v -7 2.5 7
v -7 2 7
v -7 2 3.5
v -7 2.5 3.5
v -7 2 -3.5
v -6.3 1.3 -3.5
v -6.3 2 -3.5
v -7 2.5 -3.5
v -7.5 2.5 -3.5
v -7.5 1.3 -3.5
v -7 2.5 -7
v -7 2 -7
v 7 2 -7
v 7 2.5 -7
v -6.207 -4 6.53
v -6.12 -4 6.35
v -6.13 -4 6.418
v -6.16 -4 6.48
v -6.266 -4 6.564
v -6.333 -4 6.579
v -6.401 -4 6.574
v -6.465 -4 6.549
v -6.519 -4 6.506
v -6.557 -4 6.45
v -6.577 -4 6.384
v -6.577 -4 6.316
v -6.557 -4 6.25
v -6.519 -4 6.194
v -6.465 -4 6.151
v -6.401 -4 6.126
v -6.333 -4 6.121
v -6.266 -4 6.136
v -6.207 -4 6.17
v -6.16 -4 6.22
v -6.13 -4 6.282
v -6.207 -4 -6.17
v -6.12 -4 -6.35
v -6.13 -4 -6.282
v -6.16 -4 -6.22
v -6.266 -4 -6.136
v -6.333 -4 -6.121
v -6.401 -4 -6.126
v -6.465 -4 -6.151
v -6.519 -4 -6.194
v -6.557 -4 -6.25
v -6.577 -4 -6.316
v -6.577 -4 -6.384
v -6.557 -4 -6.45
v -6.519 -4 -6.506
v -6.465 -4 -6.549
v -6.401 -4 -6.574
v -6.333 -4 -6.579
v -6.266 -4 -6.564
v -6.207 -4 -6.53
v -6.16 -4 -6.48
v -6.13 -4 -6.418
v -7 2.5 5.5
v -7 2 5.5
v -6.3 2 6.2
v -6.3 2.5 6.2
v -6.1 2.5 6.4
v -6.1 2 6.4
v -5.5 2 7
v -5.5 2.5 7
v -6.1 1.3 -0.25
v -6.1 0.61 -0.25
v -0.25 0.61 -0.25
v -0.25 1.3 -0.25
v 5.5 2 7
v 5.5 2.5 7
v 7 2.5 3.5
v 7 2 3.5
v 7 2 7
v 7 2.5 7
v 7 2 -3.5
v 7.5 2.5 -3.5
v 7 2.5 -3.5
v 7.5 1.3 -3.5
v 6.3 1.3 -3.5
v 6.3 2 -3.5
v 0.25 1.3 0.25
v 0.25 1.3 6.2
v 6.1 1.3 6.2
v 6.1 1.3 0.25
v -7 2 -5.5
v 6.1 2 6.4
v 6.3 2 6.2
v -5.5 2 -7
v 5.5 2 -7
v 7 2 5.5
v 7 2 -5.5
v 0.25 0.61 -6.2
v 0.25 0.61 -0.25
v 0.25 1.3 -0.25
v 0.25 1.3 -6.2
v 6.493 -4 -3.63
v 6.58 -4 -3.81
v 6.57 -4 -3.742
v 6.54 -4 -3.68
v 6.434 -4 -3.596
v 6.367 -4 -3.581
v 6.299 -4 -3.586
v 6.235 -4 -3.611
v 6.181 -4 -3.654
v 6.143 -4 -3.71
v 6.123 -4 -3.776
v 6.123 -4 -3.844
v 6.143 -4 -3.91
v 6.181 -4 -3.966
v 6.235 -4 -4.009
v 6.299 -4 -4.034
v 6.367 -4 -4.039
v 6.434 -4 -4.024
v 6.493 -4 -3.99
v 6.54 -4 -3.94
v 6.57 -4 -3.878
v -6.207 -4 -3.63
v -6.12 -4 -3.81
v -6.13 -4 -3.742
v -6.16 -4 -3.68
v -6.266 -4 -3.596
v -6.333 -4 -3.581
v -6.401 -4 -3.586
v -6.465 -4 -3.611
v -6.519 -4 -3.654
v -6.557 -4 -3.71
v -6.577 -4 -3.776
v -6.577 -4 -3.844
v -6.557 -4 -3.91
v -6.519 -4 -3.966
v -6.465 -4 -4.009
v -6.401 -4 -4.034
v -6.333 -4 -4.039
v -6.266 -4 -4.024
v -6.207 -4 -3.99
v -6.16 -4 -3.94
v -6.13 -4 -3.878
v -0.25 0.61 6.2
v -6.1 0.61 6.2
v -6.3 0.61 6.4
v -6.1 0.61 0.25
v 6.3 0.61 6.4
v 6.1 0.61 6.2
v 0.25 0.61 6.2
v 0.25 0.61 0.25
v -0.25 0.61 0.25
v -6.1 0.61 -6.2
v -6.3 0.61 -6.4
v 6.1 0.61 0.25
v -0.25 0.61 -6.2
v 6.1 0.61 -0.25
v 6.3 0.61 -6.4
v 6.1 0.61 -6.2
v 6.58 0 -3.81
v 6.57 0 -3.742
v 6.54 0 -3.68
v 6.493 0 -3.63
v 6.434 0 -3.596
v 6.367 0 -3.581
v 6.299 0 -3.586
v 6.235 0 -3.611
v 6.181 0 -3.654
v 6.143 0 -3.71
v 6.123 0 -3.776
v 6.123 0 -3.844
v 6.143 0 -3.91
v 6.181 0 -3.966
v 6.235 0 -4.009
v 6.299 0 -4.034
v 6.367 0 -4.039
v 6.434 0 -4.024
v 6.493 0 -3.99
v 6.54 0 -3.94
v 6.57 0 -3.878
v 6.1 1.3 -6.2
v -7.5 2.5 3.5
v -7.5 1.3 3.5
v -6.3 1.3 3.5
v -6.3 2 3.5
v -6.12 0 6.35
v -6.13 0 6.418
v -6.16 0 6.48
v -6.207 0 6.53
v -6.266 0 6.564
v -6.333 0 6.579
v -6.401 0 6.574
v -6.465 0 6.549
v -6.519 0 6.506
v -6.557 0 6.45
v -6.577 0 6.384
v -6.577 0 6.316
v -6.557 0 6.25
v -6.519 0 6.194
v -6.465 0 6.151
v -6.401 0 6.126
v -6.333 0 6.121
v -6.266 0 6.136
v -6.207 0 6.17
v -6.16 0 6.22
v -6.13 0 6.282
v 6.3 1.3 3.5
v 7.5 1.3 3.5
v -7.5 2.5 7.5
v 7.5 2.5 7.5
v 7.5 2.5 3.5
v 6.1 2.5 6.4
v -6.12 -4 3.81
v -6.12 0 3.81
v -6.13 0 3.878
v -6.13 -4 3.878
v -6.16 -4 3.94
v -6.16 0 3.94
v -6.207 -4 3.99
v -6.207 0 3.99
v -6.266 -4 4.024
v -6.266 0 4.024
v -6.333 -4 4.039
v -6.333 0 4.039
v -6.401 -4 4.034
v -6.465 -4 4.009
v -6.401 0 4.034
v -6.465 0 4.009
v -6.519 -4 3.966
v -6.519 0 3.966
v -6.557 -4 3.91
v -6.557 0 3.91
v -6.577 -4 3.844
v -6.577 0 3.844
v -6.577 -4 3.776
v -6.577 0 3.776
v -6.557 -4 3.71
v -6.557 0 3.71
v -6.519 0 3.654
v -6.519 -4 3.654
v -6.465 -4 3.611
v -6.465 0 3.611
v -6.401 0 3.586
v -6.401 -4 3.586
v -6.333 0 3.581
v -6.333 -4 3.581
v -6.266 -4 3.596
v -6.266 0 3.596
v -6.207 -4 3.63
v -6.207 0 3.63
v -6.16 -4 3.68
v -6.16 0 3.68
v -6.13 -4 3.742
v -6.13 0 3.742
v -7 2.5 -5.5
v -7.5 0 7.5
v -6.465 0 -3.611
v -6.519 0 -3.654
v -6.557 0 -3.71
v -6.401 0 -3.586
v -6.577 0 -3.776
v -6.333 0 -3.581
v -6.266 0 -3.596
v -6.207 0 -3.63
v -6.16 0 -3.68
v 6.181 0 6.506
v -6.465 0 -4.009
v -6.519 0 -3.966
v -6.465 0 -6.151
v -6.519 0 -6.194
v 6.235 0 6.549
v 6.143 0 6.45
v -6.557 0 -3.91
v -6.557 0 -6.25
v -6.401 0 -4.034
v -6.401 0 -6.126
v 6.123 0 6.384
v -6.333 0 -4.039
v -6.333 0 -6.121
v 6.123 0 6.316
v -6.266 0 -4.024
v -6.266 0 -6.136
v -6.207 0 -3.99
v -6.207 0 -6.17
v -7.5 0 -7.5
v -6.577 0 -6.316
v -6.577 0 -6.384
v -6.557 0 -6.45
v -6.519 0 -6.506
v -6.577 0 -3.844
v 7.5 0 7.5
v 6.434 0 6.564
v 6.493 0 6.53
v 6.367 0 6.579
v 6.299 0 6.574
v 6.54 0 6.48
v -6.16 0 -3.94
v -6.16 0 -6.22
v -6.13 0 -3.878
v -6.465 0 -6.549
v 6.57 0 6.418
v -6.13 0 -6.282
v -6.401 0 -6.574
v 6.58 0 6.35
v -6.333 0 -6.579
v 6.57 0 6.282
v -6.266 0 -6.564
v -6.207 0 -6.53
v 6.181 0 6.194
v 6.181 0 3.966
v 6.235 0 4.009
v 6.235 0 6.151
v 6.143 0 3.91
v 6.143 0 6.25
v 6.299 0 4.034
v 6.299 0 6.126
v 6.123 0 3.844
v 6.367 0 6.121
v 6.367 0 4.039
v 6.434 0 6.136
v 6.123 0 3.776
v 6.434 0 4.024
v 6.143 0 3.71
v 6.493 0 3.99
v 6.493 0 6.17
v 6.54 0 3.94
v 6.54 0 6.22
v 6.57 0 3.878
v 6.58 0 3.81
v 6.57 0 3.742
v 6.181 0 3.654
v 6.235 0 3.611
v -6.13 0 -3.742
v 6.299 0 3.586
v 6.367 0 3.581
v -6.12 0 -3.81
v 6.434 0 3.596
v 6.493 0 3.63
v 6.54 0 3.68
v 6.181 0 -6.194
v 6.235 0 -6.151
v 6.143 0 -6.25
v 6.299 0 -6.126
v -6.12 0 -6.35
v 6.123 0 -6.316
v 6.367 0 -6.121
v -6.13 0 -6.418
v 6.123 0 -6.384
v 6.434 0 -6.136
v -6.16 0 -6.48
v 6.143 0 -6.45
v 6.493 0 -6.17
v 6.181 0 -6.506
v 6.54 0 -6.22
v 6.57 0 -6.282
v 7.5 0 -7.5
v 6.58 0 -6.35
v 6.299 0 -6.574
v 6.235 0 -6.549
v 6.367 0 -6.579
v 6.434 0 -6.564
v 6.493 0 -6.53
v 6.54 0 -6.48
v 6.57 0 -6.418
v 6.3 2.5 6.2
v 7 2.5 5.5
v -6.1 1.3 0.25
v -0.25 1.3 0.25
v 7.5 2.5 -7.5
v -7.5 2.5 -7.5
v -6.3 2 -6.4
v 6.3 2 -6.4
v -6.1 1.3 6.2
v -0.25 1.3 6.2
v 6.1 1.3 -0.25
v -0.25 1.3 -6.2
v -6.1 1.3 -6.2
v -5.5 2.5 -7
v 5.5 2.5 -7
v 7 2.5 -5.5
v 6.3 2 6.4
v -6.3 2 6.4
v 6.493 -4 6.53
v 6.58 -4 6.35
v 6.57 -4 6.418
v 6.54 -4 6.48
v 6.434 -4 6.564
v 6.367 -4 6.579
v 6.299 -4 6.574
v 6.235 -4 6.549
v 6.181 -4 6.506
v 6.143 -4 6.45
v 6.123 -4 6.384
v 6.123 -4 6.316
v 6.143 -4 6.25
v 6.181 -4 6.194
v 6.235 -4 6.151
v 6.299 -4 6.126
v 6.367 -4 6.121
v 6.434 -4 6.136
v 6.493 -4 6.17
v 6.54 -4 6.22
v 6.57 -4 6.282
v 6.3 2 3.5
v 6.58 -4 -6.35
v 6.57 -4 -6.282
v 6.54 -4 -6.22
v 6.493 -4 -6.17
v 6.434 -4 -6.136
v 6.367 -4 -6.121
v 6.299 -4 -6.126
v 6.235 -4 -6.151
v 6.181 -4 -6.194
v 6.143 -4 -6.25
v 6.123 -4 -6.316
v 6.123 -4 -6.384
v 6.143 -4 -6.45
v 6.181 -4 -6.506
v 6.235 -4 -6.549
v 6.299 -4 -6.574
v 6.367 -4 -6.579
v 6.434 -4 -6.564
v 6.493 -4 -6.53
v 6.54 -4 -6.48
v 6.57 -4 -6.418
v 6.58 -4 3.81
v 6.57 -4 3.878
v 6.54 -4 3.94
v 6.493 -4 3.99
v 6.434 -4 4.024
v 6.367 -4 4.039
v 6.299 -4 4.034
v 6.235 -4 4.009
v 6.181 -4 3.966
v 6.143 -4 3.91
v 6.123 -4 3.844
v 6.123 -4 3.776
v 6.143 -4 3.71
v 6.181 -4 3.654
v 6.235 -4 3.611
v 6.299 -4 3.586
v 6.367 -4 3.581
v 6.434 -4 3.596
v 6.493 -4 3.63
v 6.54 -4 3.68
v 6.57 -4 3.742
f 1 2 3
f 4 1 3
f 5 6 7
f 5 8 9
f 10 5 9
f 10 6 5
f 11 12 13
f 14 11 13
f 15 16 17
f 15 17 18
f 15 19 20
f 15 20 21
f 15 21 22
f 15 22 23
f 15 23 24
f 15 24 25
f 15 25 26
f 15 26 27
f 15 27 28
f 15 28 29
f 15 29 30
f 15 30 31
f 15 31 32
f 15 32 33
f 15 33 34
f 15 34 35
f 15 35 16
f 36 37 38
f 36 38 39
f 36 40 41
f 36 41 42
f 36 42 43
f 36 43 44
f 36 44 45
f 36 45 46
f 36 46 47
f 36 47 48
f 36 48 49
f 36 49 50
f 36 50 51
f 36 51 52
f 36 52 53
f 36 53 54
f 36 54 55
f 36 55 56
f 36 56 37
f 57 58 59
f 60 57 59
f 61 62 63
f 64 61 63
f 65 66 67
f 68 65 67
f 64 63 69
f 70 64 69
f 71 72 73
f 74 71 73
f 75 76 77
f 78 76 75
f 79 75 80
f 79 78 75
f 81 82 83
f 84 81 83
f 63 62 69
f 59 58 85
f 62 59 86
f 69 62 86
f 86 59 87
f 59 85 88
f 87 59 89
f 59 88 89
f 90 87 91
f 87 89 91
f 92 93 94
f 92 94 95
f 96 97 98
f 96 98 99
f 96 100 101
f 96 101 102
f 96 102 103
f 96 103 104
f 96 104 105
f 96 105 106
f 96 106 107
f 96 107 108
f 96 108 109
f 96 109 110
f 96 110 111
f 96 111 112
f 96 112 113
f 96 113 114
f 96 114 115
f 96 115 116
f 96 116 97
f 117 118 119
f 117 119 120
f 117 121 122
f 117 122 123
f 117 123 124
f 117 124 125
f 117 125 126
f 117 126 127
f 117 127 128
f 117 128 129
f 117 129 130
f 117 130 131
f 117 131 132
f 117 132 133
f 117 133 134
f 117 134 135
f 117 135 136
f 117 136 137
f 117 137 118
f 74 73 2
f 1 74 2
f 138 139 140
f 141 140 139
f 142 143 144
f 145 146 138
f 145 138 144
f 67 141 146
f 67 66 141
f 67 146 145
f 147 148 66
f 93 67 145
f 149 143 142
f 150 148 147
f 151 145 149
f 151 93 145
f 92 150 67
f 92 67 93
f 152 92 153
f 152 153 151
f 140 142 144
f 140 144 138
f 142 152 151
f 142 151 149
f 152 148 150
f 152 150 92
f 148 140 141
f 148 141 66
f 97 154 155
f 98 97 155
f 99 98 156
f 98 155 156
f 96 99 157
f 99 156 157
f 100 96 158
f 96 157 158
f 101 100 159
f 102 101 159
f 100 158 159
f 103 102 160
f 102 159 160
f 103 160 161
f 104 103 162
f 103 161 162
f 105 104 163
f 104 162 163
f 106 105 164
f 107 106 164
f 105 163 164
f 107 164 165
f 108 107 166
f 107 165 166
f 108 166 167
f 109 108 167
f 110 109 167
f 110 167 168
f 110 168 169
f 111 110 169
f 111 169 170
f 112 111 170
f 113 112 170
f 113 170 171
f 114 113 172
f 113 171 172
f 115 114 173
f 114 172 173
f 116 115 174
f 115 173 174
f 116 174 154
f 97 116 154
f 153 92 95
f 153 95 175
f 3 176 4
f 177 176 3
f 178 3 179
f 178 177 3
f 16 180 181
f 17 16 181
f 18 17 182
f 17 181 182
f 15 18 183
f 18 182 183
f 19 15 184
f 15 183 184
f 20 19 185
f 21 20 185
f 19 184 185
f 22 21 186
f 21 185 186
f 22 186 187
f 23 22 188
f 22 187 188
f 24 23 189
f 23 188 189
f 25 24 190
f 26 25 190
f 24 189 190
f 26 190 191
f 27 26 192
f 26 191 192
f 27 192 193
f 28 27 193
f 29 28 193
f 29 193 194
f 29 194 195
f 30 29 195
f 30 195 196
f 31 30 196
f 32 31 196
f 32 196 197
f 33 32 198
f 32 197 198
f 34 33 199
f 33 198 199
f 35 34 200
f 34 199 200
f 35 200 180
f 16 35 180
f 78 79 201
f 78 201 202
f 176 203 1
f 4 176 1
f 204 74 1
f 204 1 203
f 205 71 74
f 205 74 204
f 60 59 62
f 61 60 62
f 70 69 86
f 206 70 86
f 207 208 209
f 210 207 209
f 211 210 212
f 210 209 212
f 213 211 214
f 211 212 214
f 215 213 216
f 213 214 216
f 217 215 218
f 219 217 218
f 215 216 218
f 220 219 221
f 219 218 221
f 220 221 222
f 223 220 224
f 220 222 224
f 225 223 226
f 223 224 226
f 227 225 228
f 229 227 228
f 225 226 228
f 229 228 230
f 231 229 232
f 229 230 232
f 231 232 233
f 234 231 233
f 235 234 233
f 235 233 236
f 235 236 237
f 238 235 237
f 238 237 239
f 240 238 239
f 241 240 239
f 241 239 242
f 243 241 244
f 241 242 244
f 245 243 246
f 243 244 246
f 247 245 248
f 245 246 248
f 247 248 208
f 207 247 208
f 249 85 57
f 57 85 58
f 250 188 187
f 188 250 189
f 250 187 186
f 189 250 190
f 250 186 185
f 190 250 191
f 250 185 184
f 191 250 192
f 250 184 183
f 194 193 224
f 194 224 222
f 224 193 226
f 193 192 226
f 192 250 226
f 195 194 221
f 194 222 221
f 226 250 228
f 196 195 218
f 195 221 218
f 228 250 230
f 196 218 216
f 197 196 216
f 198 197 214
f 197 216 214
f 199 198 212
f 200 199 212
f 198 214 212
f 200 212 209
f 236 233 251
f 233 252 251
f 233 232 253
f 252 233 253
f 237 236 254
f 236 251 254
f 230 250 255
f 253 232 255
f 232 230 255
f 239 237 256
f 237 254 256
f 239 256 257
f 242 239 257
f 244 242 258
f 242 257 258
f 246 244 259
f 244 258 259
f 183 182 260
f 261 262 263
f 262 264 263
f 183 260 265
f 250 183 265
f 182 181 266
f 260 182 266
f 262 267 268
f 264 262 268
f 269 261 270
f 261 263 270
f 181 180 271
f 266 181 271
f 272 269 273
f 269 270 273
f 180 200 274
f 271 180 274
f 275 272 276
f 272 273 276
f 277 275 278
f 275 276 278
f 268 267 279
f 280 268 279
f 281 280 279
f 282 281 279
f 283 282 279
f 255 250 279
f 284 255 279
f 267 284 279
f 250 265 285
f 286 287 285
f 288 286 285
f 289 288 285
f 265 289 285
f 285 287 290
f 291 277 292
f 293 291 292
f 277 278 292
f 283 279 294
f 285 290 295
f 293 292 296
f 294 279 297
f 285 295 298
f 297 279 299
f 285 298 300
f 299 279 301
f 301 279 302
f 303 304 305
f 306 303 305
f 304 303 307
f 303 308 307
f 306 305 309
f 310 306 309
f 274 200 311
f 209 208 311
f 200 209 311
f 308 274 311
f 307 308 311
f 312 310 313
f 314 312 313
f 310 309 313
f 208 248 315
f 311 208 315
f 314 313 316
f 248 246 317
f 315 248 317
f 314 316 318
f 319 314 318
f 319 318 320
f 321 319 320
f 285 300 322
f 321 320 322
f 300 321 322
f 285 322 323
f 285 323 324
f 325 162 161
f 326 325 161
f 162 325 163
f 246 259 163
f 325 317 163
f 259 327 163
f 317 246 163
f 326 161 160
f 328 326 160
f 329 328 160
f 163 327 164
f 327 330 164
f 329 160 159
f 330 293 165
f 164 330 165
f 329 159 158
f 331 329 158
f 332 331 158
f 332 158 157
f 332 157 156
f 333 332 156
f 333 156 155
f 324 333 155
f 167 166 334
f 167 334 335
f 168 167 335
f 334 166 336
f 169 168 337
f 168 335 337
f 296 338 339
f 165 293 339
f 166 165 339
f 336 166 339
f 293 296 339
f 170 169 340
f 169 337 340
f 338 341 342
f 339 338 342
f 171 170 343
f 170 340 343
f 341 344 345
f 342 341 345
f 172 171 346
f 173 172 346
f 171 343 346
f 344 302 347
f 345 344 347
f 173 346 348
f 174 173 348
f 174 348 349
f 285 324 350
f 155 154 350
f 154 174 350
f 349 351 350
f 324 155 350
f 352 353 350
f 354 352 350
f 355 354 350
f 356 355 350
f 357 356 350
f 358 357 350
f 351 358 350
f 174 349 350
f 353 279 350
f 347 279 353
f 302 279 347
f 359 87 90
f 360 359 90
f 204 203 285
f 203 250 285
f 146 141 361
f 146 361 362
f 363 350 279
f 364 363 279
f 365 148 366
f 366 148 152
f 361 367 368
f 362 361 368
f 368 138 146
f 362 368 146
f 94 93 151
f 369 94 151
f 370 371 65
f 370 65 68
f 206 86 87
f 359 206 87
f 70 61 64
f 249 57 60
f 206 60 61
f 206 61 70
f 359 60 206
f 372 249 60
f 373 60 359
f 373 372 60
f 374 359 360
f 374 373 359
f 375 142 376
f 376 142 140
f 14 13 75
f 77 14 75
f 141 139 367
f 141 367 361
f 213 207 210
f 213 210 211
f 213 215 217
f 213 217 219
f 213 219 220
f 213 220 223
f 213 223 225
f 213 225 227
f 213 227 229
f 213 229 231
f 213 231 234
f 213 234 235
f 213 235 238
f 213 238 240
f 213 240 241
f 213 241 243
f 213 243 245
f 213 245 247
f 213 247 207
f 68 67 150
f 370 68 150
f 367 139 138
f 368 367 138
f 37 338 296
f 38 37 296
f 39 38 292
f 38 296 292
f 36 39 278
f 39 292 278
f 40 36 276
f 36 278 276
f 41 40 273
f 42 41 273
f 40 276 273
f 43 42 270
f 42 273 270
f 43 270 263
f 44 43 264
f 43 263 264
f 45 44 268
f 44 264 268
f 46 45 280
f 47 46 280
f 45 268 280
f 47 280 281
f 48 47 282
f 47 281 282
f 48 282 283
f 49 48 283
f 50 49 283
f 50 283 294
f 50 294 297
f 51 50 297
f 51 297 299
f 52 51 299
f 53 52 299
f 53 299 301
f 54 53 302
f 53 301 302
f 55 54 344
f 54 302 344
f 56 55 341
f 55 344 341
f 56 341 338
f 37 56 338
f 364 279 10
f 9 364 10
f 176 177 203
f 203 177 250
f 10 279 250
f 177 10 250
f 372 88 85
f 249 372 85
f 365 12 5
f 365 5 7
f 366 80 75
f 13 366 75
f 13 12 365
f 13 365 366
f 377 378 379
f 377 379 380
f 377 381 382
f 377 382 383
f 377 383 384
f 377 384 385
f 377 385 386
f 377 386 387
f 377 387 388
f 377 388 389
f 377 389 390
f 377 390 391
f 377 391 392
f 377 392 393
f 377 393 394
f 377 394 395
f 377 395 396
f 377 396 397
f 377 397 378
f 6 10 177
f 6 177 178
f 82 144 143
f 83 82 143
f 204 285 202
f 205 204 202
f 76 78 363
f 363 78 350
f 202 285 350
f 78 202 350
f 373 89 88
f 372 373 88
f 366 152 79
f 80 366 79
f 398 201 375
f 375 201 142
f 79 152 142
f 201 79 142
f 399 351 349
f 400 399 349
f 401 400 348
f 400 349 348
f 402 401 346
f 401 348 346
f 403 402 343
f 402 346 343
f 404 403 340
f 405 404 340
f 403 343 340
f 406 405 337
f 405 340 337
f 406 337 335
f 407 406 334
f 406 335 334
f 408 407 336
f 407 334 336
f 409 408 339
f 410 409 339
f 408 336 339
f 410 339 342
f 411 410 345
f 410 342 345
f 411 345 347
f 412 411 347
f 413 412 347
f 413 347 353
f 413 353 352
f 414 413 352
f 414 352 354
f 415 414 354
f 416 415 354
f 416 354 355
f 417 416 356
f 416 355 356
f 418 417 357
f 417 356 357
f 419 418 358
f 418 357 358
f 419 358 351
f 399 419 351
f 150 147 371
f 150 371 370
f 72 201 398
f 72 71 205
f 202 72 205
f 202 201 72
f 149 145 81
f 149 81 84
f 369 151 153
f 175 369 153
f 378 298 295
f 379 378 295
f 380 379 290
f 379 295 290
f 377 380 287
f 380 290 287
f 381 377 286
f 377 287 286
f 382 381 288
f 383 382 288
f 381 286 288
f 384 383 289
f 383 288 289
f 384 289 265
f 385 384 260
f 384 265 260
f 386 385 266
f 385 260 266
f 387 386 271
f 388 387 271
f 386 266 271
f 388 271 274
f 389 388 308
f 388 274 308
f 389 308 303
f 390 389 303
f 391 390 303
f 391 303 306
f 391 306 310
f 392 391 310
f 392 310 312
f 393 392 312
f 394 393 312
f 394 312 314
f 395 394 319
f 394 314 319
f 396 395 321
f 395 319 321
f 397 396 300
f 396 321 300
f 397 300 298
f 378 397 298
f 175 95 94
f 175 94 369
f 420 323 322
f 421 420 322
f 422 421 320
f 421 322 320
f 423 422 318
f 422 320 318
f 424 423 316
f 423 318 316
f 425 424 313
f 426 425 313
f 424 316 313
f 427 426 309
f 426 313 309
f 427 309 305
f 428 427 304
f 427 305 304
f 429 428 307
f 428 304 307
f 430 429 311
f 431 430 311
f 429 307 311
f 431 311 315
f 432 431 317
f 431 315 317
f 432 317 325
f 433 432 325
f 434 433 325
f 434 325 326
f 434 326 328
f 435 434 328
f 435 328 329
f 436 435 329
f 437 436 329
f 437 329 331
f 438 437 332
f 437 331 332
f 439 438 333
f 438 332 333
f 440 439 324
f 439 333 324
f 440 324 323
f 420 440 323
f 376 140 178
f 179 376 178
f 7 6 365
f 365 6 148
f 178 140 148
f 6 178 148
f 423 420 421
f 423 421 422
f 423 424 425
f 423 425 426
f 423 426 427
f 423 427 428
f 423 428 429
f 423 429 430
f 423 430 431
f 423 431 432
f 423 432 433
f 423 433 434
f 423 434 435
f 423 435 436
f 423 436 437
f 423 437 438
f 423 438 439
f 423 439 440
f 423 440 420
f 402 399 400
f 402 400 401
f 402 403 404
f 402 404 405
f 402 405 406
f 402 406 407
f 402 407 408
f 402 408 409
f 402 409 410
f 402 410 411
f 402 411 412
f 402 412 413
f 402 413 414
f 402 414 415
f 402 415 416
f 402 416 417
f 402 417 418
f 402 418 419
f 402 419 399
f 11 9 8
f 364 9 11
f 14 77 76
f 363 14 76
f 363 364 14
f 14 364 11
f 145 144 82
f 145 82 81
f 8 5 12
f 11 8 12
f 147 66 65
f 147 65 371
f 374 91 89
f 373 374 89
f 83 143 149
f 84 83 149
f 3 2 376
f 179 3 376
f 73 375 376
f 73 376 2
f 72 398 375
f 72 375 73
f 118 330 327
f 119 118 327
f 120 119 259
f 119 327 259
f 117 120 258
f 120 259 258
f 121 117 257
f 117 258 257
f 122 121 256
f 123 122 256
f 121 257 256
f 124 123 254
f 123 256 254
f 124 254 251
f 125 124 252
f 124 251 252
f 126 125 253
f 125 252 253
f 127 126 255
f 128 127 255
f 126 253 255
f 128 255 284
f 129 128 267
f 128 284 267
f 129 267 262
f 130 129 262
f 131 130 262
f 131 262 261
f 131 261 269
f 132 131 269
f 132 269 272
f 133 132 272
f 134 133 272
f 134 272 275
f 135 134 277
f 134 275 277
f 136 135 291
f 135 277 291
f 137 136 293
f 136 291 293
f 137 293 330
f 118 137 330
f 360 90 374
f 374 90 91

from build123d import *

# Parameters (mm, degrees)
SKETCH1_W           = 15
SKETCH1_H           = 15
BOSS_EXTRUDE1_DEPTH = 0.61
BOSS_EXTRUDE2_START = 0.61
SKETCH1_3_W         = 5.85
SKETCH1_3_H         = 5.95
BOSS_EXTRUDE2_DEPTH = 0.69
BOSS_EXTRUDE3_START = 0.61
SKETCH1_4_W         = 0.5
SKETCH1_4_H         = 7
BOSS_EXTRUDE3_DEPTH = 1.39
BOSS_EXTRUDE4_START = 2
SKETCH1_7_W         = 0.5
SKETCH1_7_H         = 7
BOSS_EXTRUDE4_DEPTH = 0.5
CUT_EXTRUDE1_START  = 1.3
SKETCH1_6_W         = 0.5
SKETCH1_6_H         = 7
CUT_EXTRUDE1_DEPTH  = 1.2
SKETCH2_R           = 0.23
BOSS_EXTRUDE5_DEPTH = 3.999992
BOSS_EXTRUDE6_DEPTH = 0.5


with BuildPart() as part:
    # Sketch1 → Boss-Extrude1 (new body)
    with BuildSketch(Plane(origin=(0, 0, 0), x_dir=(1, 0, 0), z_dir=(0, 1, 0))):
        Rectangle(SKETCH1_W, SKETCH1_H)
    extrude(amount=BOSS_EXTRUDE1_DEPTH)

    # Sketch1_3 → Boss-Extrude2 (add)
    with BuildSketch(Plane(origin=(0, 0, 0), x_dir=(1, 0, 0), z_dir=(0, 1, 0)).offset(BOSS_EXTRUDE2_START)):
        with Locations((-3.175, 3.225)):
            Rectangle(SKETCH1_3_W, SKETCH1_3_H)
        with Locations((-3.175, -3.225)):
            Rectangle(SKETCH1_3_W, SKETCH1_3_H)
        with Locations((3.175, -3.225)):
            Rectangle(SKETCH1_3_W, SKETCH1_3_H)
        with Locations((3.175, 3.225)):
            Rectangle(SKETCH1_3_W, SKETCH1_3_H)
    extrude(amount=BOSS_EXTRUDE2_DEPTH)

    # Sketch1_4 → Boss-Extrude3 (add)
    with BuildSketch(Plane(origin=(0, 0, 0), x_dir=(1, 0, 0), z_dir=(0, 1, 0)).offset(BOSS_EXTRUDE3_START)):
        Polygon((-7.5, 7.5), (-7.5, 3.5), (-7, 3.5), (-7, 7), (7, 7), (7, 3.5), (7.5, 3.5), (7.5, 7.5), align=None)
        Polygon((-7, 7), (-7, 3.5), (-6.3, 3.5), (-6.3, 6.4), (-0.05, 6.4), (0.05, 6.4), (6.3, 6.4), (6.3, 3.5), (7, 3.5), (7, 7), align=None)
        with Locations((-7.25, 0)):
            Rectangle(SKETCH1_4_W, SKETCH1_4_H)
        Polygon((-7, 3.5), (-7, -3.5), (-6.3, -3.5), (-6.3, -0.05), (-6.3, 0.05), (-6.3, 3.5), align=None)
        Polygon((-7.5, -3.5), (-7.5, -7.5), (7.5, -7.5), (7.5, -3.5), (7, -3.5), (7, -7), (-7, -7), (-7, -3.5), align=None)
        Polygon((-6.3, -3.5), (-7, -3.5), (-7, -7), (7, -7), (7, -3.5), (6.3, -3.5), (6.3, -6.4), (0.05, -6.4), (-0.05, -6.4), (-6.3, -6.4), align=None)
        Polygon((6.3, -3.5), (7, -3.5), (7, 3.5), (6.3, 3.5), (6.3, 0.05), (6.3, -0.05), align=None)
        with Locations((7.25, 0)):
            Rectangle(SKETCH1_4_W, SKETCH1_4_H)
    extrude(amount=BOSS_EXTRUDE3_DEPTH)

    # Sketch1_7 → Boss-Extrude4 (add)
    with BuildSketch(Plane(origin=(0, 0, 0), x_dir=(1, 0, 0), z_dir=(0, 1, 0)).offset(BOSS_EXTRUDE4_START)):
        Polygon((-7.5, 7.5), (-7.5, 3.5), (-7, 3.5), (-7, 7), (7, 7), (7, 3.5), (7.5, 3.5), (7.5, 7.5), align=None)
        with Locations((-7.25, 0)):
            Rectangle(SKETCH1_7_W, SKETCH1_7_H)
        Polygon((-7.5, -3.5), (-7.5, -7.5), (7.5, -7.5), (7.5, -3.5), (7, -3.5), (7, -7), (-7, -7), (-7, -3.5), align=None)
        with Locations((7.25, 0)):
            Rectangle(SKETCH1_7_W, SKETCH1_7_H)
    extrude(amount=BOSS_EXTRUDE4_DEPTH)

    # Sketch1_6 → Cut-Extrude1 (cut)
    with BuildSketch(Plane(origin=(0, 0, 0), x_dir=(1, 0, 0), z_dir=(0, 1, 0)).offset(CUT_EXTRUDE1_START)):
        with Locations((-7.25, 0)):
            Rectangle(SKETCH1_6_W, SKETCH1_6_H)
        with Locations((7.25, 0)):
            Rectangle(SKETCH1_6_W, SKETCH1_6_H)
        Polygon((-7, 3.5), (-7, -3.5), (-6.3, -3.5), (-6.3, -0.05), (-6.3, 0.05), (-6.3, 3.5), align=None)
        Polygon((6.3, -3.5), (7, -3.5), (7, 3.5), (6.3, 3.5), (6.3, 0.05), (6.3, -0.05), align=None)
    extrude(amount=CUT_EXTRUDE1_DEPTH, mode=Mode.SUBTRACT)

    # Sketch2 → Boss-Extrude5 (add)
    with BuildSketch(Plane.XZ):
        with Locations((6.35, 6.35)):
            Circle(SKETCH2_R)
        with Locations((6.35, 3.81)):
            Circle(SKETCH2_R)
        with Locations((-6.35, 3.81)):
            Circle(SKETCH2_R)
        with Locations((-6.35, 6.35)):
            Circle(SKETCH2_R)
        with Locations((6.35, -3.81)):
            Circle(SKETCH2_R)
        with Locations((6.35, -6.35)):
            Circle(SKETCH2_R)
        with Locations((-6.35, -6.35)):
            Circle(SKETCH2_R)
        with Locations((-6.35, -3.81)):
            Circle(SKETCH2_R)
    extrude(amount=BOSS_EXTRUDE5_DEPTH)


with BuildPart() as body_2:
    # Sketch3 → Boss-Extrude6 (new body)
    with BuildSketch(Plane(origin=(0, 2, 0), x_dir=(1, 0, 0), z_dir=(0, 1, 0))):
        Polygon((6.3, -6.199999978), (7, -5.5), (7, -3.5), (6.3, -3.5), align=None)
        Polygon((6.099999971, -6.4), (6.3, -6.199999978), (6.3, -3.5), (7, -3.5), (7, 5.5), (5.499999952, 7), (-5.499999952, 7), (-7, 5.5), (-7, -3.5), (-6.3, -3.5), (-6.3, -6.199999978), (-6.099999971, -6.4), align=None)
        Polygon((5.499999952, -7), (6.099999971, -6.4), (-6.099999971, -6.4), (-5.499999952, -7), align=None)
        Polygon((-7, -5.5), (-6.3, -6.199999978), (-6.3, -3.5), (-7, -3.5), align=None)
    extrude(amount=BOSS_EXTRUDE6_DEPTH)


solid = Compound([part.part, body_2.part])
